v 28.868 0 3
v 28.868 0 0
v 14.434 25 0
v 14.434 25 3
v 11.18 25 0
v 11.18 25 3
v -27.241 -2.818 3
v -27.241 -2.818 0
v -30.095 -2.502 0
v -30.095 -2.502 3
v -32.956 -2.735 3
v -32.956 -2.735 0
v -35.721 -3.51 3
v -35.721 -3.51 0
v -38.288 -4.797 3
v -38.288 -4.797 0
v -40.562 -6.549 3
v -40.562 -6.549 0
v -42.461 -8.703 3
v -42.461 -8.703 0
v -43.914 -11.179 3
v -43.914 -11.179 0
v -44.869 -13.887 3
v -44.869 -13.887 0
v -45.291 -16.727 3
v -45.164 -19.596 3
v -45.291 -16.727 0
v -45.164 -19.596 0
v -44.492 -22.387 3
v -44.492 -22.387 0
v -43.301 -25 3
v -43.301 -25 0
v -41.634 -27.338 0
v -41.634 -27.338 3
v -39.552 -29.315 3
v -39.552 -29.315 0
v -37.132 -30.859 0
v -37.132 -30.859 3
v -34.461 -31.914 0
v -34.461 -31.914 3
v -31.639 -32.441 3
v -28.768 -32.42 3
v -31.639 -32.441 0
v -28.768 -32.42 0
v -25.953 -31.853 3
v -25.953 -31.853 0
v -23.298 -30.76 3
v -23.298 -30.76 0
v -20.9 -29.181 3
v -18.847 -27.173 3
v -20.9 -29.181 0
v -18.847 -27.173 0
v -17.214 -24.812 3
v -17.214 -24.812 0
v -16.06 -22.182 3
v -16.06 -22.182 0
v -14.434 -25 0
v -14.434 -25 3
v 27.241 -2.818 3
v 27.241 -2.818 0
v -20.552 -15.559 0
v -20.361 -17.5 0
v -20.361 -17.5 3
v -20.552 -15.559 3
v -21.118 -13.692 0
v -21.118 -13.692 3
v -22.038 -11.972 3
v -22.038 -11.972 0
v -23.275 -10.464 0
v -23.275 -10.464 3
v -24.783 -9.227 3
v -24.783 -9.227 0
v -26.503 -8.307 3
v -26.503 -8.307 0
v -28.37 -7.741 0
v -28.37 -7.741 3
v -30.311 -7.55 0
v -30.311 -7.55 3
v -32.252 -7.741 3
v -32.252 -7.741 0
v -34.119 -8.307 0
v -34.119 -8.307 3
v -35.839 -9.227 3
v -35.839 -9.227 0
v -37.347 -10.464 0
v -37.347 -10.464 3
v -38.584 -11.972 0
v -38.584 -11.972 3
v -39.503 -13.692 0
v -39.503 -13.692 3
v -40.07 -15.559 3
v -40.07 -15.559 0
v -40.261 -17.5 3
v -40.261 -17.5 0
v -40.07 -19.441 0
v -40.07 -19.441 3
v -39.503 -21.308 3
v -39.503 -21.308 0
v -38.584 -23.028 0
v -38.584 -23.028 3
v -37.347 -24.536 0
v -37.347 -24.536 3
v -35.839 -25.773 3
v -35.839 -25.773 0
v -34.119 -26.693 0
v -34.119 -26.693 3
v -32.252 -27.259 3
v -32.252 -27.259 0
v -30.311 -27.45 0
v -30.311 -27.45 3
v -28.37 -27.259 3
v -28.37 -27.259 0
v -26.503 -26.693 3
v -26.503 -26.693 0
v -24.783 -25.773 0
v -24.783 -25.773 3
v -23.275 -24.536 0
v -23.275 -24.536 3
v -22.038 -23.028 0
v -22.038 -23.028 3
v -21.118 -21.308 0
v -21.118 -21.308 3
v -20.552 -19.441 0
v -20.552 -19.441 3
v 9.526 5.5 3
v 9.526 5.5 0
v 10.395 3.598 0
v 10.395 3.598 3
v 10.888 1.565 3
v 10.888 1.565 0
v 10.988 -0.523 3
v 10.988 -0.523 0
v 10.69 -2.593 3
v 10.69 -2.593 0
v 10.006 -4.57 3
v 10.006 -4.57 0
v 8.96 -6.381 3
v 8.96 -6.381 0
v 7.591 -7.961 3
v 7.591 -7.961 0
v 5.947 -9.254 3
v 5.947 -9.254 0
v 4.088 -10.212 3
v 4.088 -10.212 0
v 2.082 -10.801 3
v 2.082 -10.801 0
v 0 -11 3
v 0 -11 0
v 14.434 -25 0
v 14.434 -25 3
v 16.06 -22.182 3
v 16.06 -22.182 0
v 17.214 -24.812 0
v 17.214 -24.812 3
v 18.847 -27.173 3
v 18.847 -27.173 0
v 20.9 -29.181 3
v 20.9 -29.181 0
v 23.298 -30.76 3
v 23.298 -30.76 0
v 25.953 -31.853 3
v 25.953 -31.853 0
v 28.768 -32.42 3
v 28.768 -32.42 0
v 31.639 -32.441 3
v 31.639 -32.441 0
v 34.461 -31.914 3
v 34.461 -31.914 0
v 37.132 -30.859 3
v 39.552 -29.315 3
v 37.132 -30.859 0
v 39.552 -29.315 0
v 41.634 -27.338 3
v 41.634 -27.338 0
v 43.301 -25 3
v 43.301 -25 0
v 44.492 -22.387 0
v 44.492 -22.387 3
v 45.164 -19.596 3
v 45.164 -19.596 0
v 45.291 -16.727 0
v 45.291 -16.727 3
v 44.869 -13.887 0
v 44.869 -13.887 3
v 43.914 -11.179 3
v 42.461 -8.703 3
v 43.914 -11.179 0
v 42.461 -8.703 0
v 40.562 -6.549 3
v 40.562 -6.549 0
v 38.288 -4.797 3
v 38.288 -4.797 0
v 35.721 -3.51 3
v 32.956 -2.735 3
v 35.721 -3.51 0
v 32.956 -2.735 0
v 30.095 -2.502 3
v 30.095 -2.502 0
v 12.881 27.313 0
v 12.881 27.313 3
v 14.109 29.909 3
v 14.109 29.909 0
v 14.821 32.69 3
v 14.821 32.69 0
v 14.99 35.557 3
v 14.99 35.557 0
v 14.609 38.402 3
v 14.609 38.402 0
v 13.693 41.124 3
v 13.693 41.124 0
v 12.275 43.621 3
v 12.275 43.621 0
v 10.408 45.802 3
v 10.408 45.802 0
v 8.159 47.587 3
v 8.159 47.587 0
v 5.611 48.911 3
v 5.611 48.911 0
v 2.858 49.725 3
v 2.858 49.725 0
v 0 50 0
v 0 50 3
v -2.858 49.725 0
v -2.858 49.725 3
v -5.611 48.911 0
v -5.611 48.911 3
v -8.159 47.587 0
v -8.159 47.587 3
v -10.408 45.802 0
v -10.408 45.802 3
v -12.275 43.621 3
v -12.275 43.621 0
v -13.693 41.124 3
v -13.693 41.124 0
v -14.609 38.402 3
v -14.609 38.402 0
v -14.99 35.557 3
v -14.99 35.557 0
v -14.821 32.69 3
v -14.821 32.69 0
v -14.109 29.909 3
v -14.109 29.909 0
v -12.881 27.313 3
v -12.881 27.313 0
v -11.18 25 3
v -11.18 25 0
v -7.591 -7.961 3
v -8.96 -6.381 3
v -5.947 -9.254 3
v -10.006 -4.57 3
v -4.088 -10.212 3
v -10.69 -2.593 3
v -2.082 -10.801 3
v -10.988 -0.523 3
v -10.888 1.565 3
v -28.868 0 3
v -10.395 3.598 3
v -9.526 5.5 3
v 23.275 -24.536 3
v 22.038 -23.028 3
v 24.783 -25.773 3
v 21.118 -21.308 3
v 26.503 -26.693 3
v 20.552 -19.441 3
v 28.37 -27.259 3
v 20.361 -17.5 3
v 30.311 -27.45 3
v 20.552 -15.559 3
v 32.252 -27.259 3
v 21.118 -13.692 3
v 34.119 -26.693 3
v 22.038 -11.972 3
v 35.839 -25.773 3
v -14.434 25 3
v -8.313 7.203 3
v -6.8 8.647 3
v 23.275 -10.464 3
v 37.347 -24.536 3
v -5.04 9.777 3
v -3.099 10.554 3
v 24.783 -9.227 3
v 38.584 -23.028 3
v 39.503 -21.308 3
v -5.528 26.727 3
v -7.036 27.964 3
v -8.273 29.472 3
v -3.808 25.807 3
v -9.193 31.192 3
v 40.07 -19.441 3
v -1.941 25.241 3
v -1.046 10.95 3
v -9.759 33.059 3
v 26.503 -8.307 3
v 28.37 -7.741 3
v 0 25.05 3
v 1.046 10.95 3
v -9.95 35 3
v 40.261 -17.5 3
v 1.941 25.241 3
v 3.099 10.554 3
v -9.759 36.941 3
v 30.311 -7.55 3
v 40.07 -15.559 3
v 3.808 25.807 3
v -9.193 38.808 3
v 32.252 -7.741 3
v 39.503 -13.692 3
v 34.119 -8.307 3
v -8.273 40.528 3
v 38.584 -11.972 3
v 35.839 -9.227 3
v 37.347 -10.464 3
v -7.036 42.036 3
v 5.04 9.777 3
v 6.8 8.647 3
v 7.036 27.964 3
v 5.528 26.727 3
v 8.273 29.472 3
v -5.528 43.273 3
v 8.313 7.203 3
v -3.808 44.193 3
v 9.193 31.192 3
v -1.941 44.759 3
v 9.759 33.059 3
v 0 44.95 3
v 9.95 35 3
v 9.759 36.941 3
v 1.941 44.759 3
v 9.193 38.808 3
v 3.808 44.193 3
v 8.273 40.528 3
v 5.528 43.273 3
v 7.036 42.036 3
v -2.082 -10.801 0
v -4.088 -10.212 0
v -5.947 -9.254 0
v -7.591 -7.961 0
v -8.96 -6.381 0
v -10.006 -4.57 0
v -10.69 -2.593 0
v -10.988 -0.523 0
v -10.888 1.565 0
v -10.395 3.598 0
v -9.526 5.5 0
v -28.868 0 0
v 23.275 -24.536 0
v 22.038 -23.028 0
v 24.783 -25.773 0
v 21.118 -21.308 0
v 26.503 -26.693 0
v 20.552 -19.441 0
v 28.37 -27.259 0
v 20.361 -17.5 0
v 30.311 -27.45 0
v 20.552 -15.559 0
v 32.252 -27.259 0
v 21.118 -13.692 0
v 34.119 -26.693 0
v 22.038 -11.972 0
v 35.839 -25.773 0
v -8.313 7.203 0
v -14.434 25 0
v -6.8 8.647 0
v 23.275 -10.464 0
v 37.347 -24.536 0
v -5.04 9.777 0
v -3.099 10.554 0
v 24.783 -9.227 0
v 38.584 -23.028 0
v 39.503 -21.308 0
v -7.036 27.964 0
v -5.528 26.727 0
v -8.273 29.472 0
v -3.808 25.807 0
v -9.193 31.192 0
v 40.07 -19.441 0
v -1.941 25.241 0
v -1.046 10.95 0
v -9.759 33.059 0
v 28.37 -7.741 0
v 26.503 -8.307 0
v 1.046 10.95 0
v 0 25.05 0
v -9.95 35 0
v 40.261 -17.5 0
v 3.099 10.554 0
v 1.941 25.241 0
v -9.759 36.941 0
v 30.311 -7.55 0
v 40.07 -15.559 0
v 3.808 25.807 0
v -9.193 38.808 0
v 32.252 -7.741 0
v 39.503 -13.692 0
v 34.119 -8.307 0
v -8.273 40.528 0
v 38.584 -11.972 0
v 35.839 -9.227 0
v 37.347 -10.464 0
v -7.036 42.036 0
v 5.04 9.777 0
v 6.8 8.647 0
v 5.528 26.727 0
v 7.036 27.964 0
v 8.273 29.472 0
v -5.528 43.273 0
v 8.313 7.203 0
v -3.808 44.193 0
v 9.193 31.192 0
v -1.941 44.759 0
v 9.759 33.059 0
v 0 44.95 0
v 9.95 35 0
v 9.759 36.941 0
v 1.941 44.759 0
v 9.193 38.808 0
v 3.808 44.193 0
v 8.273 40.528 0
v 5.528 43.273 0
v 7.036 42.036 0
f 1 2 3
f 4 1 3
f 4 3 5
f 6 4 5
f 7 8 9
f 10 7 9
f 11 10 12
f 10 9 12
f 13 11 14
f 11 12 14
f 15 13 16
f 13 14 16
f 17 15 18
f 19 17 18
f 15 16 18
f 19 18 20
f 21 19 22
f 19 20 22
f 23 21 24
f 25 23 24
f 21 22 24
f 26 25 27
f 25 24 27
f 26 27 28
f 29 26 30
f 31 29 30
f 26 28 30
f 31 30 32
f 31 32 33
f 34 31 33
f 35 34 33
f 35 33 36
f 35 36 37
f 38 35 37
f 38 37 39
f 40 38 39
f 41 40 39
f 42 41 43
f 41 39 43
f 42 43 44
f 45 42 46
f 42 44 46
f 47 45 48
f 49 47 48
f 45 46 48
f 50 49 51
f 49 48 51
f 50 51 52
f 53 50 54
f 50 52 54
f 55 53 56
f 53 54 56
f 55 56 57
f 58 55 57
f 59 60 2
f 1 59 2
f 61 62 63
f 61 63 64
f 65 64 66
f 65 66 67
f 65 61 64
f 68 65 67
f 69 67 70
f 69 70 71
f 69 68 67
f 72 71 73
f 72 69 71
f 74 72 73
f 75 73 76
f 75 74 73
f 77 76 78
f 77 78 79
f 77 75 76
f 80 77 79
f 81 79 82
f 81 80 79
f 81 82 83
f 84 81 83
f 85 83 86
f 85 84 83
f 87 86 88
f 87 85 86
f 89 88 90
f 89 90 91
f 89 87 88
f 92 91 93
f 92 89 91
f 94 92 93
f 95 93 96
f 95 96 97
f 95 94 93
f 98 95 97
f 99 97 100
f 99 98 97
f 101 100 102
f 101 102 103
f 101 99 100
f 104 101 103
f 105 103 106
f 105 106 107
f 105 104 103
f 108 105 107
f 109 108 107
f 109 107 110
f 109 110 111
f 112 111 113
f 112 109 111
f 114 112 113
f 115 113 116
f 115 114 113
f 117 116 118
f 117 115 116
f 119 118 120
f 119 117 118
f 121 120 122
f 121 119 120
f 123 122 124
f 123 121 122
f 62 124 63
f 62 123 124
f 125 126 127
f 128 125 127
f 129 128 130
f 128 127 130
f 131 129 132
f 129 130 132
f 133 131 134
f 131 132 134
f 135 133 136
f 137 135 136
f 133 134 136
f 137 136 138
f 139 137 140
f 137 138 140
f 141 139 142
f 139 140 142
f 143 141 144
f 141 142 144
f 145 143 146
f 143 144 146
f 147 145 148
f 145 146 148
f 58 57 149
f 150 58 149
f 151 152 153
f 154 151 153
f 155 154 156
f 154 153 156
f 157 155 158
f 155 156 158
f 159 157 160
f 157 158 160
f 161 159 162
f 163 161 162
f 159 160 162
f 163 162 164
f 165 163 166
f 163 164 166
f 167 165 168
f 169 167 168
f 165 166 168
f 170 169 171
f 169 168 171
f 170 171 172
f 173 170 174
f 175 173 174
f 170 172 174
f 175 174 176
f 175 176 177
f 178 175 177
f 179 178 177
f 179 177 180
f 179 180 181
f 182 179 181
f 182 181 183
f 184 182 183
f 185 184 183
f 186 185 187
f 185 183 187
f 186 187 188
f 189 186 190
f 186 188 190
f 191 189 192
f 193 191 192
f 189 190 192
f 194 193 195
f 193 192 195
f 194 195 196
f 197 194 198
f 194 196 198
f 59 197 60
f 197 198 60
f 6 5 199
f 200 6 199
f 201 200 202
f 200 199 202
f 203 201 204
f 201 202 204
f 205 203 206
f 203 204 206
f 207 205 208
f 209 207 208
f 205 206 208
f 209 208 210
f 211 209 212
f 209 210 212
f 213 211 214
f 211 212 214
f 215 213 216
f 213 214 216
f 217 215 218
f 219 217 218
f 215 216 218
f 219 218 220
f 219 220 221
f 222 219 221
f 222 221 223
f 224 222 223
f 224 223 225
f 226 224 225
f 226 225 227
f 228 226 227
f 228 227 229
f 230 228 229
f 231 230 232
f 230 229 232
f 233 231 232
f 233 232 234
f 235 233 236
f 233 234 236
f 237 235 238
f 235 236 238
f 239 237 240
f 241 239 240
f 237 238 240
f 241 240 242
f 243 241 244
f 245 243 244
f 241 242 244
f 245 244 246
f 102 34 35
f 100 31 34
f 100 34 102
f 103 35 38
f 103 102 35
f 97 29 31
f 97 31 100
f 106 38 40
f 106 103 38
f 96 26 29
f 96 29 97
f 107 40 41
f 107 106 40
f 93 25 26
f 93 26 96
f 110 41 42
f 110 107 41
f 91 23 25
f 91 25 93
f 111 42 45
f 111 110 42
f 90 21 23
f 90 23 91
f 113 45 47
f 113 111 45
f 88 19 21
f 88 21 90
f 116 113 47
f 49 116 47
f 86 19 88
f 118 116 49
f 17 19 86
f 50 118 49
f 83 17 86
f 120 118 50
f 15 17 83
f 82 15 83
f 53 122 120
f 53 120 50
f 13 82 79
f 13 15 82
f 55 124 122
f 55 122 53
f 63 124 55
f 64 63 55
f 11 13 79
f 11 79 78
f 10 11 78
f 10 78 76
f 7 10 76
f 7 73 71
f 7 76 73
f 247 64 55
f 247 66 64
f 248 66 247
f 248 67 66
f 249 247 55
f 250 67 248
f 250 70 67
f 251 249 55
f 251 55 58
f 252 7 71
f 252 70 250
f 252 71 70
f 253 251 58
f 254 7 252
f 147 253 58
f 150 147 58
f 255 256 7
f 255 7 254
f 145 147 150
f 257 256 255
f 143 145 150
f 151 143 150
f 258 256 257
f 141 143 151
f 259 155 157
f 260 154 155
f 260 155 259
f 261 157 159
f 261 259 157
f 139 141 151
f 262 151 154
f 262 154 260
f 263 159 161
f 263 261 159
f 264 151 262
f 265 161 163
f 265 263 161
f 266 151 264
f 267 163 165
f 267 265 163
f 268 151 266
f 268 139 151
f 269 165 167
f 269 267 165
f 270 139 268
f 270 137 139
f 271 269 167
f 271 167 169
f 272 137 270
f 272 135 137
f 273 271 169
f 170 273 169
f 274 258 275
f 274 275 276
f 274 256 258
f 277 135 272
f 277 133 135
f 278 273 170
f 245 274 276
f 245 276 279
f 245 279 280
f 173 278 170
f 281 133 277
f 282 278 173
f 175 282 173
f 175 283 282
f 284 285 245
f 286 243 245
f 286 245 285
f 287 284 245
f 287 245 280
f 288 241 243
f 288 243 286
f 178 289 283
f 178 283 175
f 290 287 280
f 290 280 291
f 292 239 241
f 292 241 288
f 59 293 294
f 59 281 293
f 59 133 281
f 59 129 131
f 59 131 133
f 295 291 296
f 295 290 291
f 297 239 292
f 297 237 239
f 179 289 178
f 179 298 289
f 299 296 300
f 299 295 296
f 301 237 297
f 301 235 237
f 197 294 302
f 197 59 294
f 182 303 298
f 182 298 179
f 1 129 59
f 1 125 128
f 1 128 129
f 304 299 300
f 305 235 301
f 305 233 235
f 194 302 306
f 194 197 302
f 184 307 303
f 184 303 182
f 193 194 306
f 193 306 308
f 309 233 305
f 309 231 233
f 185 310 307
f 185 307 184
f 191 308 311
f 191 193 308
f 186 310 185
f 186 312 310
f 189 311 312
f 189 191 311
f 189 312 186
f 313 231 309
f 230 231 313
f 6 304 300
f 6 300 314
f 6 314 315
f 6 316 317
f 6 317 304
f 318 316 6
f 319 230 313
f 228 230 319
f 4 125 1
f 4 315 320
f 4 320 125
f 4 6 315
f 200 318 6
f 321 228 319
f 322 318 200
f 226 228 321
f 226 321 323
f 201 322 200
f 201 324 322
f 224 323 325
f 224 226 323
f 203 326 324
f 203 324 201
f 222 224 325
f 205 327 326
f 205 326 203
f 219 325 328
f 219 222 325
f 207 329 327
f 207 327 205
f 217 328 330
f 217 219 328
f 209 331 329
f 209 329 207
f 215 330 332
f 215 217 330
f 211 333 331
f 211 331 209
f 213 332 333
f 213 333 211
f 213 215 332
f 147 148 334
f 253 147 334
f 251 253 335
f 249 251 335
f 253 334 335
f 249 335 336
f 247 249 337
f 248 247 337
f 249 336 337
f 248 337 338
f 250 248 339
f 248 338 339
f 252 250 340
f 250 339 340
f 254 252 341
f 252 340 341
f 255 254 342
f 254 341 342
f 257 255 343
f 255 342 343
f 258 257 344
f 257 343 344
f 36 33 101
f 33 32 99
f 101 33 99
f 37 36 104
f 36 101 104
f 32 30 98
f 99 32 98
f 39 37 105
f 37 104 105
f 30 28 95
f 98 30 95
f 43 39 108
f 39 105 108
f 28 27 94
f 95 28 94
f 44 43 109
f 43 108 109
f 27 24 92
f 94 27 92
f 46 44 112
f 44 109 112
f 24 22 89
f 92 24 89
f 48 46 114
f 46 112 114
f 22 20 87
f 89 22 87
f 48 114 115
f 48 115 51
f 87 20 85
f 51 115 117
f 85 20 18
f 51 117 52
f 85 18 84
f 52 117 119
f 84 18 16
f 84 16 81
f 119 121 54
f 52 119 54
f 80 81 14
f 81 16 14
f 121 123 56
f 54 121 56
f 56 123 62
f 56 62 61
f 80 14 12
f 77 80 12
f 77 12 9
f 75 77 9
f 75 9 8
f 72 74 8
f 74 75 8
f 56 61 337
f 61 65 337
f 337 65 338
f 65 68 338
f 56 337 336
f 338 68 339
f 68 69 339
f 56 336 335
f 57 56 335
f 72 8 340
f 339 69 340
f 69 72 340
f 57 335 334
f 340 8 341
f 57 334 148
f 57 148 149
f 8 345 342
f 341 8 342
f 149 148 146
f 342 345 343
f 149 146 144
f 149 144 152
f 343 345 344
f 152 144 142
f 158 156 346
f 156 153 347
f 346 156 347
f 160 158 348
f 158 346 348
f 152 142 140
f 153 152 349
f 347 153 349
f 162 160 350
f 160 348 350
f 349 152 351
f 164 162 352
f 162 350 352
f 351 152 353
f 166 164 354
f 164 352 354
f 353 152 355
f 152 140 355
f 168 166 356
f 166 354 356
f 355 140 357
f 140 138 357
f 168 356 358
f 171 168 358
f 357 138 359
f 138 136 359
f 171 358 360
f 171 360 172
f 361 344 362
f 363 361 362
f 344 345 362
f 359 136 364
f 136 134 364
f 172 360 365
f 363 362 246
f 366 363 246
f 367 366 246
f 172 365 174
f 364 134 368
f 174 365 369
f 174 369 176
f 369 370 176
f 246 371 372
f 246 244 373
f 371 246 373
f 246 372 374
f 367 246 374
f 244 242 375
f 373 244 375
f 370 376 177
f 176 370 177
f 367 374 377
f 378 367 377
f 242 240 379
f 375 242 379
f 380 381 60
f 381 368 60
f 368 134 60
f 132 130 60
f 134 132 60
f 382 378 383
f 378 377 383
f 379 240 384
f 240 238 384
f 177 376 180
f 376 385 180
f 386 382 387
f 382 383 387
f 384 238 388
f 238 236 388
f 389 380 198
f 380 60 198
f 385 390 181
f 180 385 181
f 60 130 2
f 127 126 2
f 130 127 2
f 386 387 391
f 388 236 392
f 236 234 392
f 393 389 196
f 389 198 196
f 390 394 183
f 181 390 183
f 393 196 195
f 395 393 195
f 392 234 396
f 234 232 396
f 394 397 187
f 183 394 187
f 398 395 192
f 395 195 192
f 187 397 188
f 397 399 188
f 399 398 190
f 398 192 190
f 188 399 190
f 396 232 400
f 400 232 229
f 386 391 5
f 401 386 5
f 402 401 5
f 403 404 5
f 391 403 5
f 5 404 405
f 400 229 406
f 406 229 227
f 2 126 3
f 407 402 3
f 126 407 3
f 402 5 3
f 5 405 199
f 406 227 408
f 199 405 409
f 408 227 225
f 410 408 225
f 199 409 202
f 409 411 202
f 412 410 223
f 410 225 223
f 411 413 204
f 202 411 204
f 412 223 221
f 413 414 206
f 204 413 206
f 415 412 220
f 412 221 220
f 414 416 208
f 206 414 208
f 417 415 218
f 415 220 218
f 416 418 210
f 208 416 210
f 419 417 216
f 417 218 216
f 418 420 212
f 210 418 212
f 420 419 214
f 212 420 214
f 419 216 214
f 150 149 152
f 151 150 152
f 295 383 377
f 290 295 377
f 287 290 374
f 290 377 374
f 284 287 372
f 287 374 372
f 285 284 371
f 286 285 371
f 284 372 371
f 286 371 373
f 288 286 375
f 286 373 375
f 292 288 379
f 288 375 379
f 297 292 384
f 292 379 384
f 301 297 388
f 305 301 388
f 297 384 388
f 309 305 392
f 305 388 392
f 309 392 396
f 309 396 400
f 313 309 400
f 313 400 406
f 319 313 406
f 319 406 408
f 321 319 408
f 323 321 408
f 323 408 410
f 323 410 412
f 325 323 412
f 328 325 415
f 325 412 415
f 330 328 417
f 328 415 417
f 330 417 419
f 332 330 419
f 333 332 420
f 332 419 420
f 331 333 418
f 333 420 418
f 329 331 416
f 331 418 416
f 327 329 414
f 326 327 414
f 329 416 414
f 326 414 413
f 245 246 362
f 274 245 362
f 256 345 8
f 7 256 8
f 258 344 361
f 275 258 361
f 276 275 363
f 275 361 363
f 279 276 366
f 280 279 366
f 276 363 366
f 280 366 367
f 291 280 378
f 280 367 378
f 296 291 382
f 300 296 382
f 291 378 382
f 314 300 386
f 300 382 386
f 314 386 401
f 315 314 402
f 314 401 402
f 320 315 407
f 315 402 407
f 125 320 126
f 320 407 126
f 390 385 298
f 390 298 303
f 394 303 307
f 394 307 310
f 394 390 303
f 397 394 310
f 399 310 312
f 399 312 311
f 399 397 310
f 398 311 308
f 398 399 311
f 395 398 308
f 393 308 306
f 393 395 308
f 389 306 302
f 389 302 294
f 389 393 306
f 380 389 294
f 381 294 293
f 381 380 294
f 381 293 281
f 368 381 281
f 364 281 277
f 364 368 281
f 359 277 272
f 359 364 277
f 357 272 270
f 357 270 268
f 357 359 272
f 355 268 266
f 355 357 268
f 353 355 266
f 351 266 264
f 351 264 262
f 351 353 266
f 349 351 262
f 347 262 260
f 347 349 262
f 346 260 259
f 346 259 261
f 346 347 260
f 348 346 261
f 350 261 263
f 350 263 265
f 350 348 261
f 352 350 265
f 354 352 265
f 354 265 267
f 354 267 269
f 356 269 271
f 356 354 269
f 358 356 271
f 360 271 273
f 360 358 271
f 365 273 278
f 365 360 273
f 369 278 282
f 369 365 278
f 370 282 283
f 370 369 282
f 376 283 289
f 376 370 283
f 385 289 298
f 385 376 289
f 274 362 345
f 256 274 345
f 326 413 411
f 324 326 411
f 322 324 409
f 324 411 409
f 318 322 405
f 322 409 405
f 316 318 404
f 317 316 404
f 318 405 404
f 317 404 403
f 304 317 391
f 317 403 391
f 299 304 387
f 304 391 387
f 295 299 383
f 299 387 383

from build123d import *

# Parameters (mm, degrees)
F0_R     = 9.95
F1_DEPTH = 3


with BuildPart() as f1:
    # F0 (on Top) → F1 (new body)
    with BuildSketch(Plane.XY):
        with BuildLine():
            Line((-11.18034, 25), (-14.433757, 25))
            Line((-14.433757, 25), (-21.650635, 12.5))
            Line((-21.650635, 12.5), (-28.867513, 0))
            Line((-28.867513, 0), (-27.240805, -2.817542))
            ThreePointArc((-27.240805, -2.817542), (-43.30127, -25), (-16.060465, -22.182458))
            Line((-16.060465, -22.182458), (-14.433757, -25))
            Line((-14.433757, -25), (0, -25))
            Line((0, -25), (14.433757, -25))
            Line((14.433757, -25), (16.060465, -22.182458))
            ThreePointArc((16.060465, -22.182458), (43.30127, -25), (27.240805, -2.817542))
            Line((27.240805, -2.817542), (28.867513, 0))
            Line((28.867513, 0), (21.650635, 12.5))
            Line((21.650635, 12.5), (14.433757, 25))
            Line((14.433757, 25), (11.18034, 25))
            ThreePointArc((11.18034, 25), (0, 50), (-11.18034, 25))
        make_face()
        with Locations((-30.310889, -17.5)):
            Circle(F0_R, mode=Mode.SUBTRACT)
        with Locations((30.310889, -17.5)):
            Circle(F0_R, mode=Mode.SUBTRACT)
        with BuildLine():
            ThreePointArc((-9.526279, 5.5), (0, 11), (9.526279, 5.5))
            ThreePointArc((9.526279, 5.5), (9.526279, -5.5), (0, -11))
            ThreePointArc((0, -11), (-9.526279, -5.5), (-9.526279, 5.5))
        make_face(mode=Mode.SUBTRACT)
        with BuildLine():
            ThreePointArc((0, 25.05), (-7.035712, 42.035712), (9.95, 35))
            ThreePointArc((9.95, 35), (7.035712, 27.964288), (0, 25.05))
        make_face(mode=Mode.SUBTRACT)
    extrude(amount=F1_DEPTH)


solid = f1.part
